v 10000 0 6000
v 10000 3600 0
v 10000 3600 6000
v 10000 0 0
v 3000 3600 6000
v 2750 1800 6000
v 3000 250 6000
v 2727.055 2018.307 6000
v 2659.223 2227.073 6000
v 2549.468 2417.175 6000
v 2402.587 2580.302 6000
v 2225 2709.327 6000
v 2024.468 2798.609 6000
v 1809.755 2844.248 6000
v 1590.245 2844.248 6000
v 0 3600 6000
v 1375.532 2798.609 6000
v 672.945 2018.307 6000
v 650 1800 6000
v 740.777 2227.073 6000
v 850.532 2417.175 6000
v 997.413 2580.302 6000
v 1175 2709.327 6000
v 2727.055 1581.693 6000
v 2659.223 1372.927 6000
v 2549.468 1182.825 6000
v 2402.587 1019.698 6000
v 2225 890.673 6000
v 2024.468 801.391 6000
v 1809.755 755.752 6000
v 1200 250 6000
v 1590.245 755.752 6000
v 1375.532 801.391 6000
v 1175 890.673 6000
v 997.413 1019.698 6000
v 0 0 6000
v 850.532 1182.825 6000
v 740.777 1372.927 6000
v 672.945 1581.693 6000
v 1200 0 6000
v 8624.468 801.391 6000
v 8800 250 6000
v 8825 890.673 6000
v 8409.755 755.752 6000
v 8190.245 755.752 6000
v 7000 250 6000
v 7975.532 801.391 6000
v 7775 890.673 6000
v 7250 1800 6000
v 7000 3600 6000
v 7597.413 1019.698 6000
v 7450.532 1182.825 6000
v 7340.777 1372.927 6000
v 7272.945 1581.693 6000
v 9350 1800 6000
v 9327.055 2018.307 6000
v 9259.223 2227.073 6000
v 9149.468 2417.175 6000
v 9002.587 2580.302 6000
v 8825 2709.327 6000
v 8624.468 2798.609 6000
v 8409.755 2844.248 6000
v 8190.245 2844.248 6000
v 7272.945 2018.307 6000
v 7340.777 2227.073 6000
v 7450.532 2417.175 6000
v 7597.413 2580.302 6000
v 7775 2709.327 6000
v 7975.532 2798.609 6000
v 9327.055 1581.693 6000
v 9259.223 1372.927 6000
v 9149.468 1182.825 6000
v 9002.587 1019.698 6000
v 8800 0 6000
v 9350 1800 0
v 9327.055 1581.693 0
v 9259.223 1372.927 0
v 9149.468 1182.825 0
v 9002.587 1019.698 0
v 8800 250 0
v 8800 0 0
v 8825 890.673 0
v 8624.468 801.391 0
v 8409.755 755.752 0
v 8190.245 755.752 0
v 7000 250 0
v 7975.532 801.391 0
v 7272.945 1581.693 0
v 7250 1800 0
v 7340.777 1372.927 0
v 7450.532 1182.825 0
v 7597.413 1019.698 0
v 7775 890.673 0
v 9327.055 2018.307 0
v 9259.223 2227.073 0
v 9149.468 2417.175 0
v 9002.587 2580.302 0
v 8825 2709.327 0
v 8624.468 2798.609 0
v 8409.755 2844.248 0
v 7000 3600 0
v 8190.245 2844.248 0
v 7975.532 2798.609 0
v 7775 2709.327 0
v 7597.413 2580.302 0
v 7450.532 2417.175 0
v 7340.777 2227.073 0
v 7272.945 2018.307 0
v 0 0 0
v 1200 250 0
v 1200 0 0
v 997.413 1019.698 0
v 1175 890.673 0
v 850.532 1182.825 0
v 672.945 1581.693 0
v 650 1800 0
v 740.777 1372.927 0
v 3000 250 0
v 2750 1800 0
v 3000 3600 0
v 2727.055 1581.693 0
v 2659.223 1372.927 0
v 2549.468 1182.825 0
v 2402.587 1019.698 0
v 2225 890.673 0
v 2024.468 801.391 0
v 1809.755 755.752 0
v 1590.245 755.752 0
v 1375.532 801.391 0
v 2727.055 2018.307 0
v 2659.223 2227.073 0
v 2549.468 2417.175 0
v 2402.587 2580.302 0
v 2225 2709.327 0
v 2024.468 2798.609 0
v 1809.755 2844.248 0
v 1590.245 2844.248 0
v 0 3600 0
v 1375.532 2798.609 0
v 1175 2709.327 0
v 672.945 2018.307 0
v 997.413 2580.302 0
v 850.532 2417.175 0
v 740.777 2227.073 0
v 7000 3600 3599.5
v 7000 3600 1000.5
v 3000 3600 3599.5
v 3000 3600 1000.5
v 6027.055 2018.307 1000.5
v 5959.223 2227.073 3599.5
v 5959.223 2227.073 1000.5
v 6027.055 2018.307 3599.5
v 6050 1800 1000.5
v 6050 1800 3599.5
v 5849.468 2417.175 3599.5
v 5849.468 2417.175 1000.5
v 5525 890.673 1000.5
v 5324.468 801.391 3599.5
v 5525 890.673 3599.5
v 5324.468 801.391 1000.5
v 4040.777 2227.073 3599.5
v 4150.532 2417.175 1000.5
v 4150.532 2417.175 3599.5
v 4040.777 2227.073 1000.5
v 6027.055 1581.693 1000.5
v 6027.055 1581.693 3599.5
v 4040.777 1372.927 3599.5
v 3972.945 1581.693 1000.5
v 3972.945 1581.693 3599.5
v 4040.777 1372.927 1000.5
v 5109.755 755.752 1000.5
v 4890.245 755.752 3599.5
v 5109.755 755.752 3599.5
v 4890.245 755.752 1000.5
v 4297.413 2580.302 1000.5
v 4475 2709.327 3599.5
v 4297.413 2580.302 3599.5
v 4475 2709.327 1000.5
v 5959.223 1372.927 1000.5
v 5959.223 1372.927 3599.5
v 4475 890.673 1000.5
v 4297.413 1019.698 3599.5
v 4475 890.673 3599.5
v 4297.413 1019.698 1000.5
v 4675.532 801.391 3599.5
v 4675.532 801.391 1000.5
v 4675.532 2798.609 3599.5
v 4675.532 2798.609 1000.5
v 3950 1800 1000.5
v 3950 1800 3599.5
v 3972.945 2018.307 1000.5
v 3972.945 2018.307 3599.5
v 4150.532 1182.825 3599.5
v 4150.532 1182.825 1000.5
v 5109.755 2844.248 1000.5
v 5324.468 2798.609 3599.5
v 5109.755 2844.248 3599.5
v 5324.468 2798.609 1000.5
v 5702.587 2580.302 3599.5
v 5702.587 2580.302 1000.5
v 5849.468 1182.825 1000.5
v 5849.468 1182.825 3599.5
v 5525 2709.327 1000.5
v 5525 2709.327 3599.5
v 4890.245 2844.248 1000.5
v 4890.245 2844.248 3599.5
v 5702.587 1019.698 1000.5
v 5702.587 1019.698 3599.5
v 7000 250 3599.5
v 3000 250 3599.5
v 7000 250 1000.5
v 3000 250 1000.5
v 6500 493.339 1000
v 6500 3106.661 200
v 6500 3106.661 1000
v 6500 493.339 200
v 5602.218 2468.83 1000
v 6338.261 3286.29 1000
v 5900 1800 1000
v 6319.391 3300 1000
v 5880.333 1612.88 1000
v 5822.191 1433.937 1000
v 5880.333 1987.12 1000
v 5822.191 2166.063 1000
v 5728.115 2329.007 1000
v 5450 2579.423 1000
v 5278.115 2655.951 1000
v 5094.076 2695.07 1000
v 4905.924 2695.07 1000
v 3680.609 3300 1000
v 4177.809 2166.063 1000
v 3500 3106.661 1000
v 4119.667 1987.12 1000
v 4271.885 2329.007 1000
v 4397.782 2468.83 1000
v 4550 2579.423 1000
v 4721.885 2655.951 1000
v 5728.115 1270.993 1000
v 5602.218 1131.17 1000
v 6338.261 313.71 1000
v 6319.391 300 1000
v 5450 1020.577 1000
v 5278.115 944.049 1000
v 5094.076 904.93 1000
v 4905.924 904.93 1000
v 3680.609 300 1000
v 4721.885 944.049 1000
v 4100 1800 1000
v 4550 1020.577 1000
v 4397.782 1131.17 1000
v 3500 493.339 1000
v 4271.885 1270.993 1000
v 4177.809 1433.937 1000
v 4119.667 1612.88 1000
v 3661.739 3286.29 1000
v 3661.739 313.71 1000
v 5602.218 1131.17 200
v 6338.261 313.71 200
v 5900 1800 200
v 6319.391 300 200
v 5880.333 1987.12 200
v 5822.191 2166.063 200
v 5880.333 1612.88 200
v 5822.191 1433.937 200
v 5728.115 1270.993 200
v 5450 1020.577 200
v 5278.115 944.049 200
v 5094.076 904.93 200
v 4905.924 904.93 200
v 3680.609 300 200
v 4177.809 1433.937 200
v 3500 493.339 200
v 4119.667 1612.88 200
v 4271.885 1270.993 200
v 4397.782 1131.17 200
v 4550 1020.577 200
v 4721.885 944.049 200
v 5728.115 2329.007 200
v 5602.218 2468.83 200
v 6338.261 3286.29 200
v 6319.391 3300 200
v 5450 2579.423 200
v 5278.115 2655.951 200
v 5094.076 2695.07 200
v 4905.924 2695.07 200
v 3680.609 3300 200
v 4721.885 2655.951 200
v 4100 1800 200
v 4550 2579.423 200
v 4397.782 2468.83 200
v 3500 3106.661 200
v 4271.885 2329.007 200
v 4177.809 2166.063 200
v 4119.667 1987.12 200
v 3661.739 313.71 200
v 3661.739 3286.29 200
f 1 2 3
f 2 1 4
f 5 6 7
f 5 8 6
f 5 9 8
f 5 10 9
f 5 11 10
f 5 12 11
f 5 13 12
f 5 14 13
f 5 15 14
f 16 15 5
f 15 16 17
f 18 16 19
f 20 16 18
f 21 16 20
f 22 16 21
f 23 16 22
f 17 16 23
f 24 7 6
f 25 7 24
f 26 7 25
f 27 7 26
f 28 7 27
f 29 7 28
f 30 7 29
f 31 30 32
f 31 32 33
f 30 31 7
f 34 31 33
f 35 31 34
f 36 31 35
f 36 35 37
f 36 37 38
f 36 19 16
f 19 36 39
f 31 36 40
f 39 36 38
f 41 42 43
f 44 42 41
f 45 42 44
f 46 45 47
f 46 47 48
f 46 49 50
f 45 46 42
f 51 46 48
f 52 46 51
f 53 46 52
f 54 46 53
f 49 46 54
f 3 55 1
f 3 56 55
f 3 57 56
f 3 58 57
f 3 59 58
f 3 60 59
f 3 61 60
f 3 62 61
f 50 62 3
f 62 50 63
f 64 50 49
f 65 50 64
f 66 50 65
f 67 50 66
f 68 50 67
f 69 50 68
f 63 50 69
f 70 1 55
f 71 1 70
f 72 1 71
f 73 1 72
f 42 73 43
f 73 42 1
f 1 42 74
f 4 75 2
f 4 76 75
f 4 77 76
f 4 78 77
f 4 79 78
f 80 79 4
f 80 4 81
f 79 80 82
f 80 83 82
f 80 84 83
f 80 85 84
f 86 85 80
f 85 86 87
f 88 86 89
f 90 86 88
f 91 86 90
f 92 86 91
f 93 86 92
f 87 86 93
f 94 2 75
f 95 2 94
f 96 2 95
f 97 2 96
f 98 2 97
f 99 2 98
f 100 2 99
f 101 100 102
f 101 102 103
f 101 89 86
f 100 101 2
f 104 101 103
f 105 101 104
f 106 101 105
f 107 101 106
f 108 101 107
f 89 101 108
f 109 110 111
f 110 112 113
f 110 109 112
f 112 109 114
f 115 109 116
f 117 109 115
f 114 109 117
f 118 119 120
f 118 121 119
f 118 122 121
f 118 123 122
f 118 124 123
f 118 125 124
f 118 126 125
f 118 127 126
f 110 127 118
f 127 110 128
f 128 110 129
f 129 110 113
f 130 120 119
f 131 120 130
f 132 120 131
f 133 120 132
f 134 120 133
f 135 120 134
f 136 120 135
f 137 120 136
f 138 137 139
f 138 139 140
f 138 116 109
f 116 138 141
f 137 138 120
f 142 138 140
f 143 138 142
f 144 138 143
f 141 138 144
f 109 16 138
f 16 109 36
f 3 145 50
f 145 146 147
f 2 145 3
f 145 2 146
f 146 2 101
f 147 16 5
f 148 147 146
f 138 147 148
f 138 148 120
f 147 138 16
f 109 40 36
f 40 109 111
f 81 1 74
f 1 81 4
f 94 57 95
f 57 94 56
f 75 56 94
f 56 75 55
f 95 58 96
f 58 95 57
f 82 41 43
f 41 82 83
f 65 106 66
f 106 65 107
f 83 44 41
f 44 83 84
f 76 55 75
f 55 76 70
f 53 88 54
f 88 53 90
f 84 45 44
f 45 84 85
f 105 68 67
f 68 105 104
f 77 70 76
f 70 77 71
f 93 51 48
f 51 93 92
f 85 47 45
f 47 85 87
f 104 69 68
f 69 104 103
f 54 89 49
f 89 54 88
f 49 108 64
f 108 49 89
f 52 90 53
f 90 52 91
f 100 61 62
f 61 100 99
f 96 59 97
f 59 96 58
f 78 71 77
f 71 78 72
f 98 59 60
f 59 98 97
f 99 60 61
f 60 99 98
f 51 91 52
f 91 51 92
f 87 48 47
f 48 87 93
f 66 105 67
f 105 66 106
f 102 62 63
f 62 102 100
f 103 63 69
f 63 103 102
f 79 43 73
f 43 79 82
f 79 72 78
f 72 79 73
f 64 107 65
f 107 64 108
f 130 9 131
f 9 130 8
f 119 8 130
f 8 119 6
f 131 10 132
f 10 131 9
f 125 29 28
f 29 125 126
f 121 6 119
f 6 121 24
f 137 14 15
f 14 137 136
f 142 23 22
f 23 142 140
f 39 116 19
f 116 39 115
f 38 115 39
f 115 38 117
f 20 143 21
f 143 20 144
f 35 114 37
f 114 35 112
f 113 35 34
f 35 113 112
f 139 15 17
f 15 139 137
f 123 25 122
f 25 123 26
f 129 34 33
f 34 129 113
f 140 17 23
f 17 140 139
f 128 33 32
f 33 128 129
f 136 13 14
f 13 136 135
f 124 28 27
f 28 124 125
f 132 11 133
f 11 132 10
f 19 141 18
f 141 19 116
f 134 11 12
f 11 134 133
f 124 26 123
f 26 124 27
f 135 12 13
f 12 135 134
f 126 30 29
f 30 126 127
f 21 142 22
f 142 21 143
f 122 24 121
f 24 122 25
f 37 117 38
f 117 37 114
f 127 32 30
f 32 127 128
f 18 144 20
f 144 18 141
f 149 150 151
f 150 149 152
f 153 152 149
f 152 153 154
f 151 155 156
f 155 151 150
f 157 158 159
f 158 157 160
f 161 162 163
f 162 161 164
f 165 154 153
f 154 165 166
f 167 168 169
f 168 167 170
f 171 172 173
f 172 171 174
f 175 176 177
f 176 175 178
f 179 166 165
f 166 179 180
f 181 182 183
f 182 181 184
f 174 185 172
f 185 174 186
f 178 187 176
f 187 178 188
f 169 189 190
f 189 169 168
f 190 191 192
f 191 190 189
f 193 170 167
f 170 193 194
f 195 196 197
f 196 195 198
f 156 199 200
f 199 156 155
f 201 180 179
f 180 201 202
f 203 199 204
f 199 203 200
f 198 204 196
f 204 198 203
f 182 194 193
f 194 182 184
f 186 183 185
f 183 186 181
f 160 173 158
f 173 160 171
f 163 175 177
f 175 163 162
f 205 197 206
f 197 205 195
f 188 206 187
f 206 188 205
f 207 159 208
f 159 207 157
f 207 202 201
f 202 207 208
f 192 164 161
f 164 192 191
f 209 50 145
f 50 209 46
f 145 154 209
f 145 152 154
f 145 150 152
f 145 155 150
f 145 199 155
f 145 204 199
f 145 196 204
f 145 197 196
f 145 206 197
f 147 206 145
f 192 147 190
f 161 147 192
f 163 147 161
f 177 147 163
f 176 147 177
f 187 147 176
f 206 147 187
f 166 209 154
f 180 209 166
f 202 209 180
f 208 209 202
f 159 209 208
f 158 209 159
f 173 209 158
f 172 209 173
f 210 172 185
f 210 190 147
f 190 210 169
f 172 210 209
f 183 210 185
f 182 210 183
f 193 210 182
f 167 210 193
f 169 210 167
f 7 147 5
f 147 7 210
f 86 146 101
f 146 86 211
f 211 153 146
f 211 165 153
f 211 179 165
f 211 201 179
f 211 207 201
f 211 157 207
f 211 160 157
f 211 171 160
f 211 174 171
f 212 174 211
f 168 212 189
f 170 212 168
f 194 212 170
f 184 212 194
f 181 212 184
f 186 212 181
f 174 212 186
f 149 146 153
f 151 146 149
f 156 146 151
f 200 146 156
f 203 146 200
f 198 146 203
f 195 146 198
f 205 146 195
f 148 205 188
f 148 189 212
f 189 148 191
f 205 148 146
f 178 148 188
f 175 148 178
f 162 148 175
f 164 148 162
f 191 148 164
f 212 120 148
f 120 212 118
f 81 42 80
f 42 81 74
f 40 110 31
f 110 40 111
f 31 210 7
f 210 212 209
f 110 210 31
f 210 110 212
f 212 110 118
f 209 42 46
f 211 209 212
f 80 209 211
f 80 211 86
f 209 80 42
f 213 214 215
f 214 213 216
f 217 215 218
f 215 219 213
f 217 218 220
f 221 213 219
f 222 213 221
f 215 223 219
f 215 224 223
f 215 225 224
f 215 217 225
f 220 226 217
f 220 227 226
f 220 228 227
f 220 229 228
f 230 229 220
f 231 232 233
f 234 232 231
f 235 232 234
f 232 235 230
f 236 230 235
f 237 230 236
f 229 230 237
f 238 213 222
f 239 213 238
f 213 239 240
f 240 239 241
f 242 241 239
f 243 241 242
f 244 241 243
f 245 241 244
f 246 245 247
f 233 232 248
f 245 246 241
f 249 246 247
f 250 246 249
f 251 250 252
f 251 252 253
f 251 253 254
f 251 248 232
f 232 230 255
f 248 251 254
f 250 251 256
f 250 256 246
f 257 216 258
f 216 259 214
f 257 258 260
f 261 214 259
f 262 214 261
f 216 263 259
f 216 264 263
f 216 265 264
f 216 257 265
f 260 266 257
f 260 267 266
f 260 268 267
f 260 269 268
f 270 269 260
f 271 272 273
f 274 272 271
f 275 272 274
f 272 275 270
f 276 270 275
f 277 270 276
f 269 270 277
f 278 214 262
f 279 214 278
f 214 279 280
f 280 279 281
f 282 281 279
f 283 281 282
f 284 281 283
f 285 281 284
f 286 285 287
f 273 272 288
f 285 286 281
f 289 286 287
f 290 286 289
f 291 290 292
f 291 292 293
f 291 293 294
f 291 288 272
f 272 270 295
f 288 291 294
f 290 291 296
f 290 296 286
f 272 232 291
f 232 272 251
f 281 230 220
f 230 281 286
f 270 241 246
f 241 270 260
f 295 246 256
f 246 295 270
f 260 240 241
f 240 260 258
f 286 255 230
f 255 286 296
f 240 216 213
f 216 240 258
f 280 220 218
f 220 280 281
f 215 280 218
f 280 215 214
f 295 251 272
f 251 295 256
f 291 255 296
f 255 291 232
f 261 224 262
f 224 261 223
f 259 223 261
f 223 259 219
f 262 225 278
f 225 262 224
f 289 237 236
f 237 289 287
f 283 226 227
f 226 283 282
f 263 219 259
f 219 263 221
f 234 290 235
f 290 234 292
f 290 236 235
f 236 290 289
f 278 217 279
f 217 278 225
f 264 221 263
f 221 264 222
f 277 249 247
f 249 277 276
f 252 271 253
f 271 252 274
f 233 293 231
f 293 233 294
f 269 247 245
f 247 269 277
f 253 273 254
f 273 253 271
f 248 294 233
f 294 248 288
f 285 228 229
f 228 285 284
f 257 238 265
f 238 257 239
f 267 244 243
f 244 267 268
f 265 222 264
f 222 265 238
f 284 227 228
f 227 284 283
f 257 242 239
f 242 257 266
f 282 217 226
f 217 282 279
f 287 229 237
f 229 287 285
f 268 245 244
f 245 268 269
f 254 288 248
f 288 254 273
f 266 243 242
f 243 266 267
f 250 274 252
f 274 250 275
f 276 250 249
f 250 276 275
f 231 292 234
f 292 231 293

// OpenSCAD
// file: BallNut.scad
module BallNutSquare(r=600, h=800) {
  difference() {
    intersection() {
      cube([3000, 3000, h], center=true);
      cylinder(h, 2000, 2000, center=true);
    }
    cylinder(h + 1, r + 300, r + 300, center=true);
  }
}

module BallNutRound(r=800, h=1000) {
  difference() {
    intersection() {
      cylinder(r=2400, h=h, center=true);
      cube([3950, 5000, h], center=true);
    }
    cylinder(h + 1, r + 350, r + 350, center=true);
  }
}

BallNutSquare();
// main file
use <BallNut.scad>;

ballBearingCutoutWidth = 4000;
ballBearingBottomCutoutHeight = 1000;
ballBearingTopCutoutHeight = 2400;
ballBearingBottomCutoutWidth = 4000;
spindleMountWidth = 1200;

module ZAxisBearingBlock(height=12500, width=10000, guideRadius=600, guideBlockDepth=3600, guideBlockHeight=6000, guideXOffset=1700, guideYOffset=1800) {
  difference() {
    cube([width, guideBlockDepth, guideBlockHeight]);

    guideHoleRadius = guideRadius + 450;

    // Guide rod holes.
    translate([width - guideXOffset, guideYOffset, height / 2]) {
      cylinder(height + 1, guideHoleRadius, guideHoleRadius, center=true);
    }
    translate([guideXOffset, guideYOffset, height / 2]) {
      cylinder(height + 1, guideHoleRadius, guideHoleRadius, center=true);
    }

    // Ball screw hole.
    translate([width / 2, guideYOffset, height / 2]) {
      cylinder(height + 1, guideHoleRadius, guideHoleRadius, center=true);
    }

    // Ball bearing cutout top.
    translate([width / 2, guideBlockDepth / 2, guideBlockHeight - ballBearingTopCutoutHeight / 2]) {
      cube([ballBearingCutoutWidth, guideBlockDepth + 1, ballBearingTopCutoutHeight + 1], center=true);
    }

    // Ball bearing cutout bottom.
    translate([width / 2, guideBlockDepth / 2, ballBearingBottomCutoutHeight / 2]) {
      cube([ballBearingCutoutWidth, guideBlockDepth + 1, ballBearingBottomCutoutHeight + 1], center=true);
    }

    // Front cutout.
    translate([width / 2, 0, guideBlockHeight / 2]) {
      cube([width - spindleMountWidth * 2, 500, guideBlockHeight + 1], center=true);
    }
  }

  ballBearingHeight = 800;
  translate([width / 2, guideBlockDepth / 2, ballBearingHeight / 2 + (ballBearingBottomCutoutHeight - ballBearingHeight)]) {
    BallNutSquare(guideRadius, ballBearingHeight);
  }
}

ZAxisBearingBlock();
